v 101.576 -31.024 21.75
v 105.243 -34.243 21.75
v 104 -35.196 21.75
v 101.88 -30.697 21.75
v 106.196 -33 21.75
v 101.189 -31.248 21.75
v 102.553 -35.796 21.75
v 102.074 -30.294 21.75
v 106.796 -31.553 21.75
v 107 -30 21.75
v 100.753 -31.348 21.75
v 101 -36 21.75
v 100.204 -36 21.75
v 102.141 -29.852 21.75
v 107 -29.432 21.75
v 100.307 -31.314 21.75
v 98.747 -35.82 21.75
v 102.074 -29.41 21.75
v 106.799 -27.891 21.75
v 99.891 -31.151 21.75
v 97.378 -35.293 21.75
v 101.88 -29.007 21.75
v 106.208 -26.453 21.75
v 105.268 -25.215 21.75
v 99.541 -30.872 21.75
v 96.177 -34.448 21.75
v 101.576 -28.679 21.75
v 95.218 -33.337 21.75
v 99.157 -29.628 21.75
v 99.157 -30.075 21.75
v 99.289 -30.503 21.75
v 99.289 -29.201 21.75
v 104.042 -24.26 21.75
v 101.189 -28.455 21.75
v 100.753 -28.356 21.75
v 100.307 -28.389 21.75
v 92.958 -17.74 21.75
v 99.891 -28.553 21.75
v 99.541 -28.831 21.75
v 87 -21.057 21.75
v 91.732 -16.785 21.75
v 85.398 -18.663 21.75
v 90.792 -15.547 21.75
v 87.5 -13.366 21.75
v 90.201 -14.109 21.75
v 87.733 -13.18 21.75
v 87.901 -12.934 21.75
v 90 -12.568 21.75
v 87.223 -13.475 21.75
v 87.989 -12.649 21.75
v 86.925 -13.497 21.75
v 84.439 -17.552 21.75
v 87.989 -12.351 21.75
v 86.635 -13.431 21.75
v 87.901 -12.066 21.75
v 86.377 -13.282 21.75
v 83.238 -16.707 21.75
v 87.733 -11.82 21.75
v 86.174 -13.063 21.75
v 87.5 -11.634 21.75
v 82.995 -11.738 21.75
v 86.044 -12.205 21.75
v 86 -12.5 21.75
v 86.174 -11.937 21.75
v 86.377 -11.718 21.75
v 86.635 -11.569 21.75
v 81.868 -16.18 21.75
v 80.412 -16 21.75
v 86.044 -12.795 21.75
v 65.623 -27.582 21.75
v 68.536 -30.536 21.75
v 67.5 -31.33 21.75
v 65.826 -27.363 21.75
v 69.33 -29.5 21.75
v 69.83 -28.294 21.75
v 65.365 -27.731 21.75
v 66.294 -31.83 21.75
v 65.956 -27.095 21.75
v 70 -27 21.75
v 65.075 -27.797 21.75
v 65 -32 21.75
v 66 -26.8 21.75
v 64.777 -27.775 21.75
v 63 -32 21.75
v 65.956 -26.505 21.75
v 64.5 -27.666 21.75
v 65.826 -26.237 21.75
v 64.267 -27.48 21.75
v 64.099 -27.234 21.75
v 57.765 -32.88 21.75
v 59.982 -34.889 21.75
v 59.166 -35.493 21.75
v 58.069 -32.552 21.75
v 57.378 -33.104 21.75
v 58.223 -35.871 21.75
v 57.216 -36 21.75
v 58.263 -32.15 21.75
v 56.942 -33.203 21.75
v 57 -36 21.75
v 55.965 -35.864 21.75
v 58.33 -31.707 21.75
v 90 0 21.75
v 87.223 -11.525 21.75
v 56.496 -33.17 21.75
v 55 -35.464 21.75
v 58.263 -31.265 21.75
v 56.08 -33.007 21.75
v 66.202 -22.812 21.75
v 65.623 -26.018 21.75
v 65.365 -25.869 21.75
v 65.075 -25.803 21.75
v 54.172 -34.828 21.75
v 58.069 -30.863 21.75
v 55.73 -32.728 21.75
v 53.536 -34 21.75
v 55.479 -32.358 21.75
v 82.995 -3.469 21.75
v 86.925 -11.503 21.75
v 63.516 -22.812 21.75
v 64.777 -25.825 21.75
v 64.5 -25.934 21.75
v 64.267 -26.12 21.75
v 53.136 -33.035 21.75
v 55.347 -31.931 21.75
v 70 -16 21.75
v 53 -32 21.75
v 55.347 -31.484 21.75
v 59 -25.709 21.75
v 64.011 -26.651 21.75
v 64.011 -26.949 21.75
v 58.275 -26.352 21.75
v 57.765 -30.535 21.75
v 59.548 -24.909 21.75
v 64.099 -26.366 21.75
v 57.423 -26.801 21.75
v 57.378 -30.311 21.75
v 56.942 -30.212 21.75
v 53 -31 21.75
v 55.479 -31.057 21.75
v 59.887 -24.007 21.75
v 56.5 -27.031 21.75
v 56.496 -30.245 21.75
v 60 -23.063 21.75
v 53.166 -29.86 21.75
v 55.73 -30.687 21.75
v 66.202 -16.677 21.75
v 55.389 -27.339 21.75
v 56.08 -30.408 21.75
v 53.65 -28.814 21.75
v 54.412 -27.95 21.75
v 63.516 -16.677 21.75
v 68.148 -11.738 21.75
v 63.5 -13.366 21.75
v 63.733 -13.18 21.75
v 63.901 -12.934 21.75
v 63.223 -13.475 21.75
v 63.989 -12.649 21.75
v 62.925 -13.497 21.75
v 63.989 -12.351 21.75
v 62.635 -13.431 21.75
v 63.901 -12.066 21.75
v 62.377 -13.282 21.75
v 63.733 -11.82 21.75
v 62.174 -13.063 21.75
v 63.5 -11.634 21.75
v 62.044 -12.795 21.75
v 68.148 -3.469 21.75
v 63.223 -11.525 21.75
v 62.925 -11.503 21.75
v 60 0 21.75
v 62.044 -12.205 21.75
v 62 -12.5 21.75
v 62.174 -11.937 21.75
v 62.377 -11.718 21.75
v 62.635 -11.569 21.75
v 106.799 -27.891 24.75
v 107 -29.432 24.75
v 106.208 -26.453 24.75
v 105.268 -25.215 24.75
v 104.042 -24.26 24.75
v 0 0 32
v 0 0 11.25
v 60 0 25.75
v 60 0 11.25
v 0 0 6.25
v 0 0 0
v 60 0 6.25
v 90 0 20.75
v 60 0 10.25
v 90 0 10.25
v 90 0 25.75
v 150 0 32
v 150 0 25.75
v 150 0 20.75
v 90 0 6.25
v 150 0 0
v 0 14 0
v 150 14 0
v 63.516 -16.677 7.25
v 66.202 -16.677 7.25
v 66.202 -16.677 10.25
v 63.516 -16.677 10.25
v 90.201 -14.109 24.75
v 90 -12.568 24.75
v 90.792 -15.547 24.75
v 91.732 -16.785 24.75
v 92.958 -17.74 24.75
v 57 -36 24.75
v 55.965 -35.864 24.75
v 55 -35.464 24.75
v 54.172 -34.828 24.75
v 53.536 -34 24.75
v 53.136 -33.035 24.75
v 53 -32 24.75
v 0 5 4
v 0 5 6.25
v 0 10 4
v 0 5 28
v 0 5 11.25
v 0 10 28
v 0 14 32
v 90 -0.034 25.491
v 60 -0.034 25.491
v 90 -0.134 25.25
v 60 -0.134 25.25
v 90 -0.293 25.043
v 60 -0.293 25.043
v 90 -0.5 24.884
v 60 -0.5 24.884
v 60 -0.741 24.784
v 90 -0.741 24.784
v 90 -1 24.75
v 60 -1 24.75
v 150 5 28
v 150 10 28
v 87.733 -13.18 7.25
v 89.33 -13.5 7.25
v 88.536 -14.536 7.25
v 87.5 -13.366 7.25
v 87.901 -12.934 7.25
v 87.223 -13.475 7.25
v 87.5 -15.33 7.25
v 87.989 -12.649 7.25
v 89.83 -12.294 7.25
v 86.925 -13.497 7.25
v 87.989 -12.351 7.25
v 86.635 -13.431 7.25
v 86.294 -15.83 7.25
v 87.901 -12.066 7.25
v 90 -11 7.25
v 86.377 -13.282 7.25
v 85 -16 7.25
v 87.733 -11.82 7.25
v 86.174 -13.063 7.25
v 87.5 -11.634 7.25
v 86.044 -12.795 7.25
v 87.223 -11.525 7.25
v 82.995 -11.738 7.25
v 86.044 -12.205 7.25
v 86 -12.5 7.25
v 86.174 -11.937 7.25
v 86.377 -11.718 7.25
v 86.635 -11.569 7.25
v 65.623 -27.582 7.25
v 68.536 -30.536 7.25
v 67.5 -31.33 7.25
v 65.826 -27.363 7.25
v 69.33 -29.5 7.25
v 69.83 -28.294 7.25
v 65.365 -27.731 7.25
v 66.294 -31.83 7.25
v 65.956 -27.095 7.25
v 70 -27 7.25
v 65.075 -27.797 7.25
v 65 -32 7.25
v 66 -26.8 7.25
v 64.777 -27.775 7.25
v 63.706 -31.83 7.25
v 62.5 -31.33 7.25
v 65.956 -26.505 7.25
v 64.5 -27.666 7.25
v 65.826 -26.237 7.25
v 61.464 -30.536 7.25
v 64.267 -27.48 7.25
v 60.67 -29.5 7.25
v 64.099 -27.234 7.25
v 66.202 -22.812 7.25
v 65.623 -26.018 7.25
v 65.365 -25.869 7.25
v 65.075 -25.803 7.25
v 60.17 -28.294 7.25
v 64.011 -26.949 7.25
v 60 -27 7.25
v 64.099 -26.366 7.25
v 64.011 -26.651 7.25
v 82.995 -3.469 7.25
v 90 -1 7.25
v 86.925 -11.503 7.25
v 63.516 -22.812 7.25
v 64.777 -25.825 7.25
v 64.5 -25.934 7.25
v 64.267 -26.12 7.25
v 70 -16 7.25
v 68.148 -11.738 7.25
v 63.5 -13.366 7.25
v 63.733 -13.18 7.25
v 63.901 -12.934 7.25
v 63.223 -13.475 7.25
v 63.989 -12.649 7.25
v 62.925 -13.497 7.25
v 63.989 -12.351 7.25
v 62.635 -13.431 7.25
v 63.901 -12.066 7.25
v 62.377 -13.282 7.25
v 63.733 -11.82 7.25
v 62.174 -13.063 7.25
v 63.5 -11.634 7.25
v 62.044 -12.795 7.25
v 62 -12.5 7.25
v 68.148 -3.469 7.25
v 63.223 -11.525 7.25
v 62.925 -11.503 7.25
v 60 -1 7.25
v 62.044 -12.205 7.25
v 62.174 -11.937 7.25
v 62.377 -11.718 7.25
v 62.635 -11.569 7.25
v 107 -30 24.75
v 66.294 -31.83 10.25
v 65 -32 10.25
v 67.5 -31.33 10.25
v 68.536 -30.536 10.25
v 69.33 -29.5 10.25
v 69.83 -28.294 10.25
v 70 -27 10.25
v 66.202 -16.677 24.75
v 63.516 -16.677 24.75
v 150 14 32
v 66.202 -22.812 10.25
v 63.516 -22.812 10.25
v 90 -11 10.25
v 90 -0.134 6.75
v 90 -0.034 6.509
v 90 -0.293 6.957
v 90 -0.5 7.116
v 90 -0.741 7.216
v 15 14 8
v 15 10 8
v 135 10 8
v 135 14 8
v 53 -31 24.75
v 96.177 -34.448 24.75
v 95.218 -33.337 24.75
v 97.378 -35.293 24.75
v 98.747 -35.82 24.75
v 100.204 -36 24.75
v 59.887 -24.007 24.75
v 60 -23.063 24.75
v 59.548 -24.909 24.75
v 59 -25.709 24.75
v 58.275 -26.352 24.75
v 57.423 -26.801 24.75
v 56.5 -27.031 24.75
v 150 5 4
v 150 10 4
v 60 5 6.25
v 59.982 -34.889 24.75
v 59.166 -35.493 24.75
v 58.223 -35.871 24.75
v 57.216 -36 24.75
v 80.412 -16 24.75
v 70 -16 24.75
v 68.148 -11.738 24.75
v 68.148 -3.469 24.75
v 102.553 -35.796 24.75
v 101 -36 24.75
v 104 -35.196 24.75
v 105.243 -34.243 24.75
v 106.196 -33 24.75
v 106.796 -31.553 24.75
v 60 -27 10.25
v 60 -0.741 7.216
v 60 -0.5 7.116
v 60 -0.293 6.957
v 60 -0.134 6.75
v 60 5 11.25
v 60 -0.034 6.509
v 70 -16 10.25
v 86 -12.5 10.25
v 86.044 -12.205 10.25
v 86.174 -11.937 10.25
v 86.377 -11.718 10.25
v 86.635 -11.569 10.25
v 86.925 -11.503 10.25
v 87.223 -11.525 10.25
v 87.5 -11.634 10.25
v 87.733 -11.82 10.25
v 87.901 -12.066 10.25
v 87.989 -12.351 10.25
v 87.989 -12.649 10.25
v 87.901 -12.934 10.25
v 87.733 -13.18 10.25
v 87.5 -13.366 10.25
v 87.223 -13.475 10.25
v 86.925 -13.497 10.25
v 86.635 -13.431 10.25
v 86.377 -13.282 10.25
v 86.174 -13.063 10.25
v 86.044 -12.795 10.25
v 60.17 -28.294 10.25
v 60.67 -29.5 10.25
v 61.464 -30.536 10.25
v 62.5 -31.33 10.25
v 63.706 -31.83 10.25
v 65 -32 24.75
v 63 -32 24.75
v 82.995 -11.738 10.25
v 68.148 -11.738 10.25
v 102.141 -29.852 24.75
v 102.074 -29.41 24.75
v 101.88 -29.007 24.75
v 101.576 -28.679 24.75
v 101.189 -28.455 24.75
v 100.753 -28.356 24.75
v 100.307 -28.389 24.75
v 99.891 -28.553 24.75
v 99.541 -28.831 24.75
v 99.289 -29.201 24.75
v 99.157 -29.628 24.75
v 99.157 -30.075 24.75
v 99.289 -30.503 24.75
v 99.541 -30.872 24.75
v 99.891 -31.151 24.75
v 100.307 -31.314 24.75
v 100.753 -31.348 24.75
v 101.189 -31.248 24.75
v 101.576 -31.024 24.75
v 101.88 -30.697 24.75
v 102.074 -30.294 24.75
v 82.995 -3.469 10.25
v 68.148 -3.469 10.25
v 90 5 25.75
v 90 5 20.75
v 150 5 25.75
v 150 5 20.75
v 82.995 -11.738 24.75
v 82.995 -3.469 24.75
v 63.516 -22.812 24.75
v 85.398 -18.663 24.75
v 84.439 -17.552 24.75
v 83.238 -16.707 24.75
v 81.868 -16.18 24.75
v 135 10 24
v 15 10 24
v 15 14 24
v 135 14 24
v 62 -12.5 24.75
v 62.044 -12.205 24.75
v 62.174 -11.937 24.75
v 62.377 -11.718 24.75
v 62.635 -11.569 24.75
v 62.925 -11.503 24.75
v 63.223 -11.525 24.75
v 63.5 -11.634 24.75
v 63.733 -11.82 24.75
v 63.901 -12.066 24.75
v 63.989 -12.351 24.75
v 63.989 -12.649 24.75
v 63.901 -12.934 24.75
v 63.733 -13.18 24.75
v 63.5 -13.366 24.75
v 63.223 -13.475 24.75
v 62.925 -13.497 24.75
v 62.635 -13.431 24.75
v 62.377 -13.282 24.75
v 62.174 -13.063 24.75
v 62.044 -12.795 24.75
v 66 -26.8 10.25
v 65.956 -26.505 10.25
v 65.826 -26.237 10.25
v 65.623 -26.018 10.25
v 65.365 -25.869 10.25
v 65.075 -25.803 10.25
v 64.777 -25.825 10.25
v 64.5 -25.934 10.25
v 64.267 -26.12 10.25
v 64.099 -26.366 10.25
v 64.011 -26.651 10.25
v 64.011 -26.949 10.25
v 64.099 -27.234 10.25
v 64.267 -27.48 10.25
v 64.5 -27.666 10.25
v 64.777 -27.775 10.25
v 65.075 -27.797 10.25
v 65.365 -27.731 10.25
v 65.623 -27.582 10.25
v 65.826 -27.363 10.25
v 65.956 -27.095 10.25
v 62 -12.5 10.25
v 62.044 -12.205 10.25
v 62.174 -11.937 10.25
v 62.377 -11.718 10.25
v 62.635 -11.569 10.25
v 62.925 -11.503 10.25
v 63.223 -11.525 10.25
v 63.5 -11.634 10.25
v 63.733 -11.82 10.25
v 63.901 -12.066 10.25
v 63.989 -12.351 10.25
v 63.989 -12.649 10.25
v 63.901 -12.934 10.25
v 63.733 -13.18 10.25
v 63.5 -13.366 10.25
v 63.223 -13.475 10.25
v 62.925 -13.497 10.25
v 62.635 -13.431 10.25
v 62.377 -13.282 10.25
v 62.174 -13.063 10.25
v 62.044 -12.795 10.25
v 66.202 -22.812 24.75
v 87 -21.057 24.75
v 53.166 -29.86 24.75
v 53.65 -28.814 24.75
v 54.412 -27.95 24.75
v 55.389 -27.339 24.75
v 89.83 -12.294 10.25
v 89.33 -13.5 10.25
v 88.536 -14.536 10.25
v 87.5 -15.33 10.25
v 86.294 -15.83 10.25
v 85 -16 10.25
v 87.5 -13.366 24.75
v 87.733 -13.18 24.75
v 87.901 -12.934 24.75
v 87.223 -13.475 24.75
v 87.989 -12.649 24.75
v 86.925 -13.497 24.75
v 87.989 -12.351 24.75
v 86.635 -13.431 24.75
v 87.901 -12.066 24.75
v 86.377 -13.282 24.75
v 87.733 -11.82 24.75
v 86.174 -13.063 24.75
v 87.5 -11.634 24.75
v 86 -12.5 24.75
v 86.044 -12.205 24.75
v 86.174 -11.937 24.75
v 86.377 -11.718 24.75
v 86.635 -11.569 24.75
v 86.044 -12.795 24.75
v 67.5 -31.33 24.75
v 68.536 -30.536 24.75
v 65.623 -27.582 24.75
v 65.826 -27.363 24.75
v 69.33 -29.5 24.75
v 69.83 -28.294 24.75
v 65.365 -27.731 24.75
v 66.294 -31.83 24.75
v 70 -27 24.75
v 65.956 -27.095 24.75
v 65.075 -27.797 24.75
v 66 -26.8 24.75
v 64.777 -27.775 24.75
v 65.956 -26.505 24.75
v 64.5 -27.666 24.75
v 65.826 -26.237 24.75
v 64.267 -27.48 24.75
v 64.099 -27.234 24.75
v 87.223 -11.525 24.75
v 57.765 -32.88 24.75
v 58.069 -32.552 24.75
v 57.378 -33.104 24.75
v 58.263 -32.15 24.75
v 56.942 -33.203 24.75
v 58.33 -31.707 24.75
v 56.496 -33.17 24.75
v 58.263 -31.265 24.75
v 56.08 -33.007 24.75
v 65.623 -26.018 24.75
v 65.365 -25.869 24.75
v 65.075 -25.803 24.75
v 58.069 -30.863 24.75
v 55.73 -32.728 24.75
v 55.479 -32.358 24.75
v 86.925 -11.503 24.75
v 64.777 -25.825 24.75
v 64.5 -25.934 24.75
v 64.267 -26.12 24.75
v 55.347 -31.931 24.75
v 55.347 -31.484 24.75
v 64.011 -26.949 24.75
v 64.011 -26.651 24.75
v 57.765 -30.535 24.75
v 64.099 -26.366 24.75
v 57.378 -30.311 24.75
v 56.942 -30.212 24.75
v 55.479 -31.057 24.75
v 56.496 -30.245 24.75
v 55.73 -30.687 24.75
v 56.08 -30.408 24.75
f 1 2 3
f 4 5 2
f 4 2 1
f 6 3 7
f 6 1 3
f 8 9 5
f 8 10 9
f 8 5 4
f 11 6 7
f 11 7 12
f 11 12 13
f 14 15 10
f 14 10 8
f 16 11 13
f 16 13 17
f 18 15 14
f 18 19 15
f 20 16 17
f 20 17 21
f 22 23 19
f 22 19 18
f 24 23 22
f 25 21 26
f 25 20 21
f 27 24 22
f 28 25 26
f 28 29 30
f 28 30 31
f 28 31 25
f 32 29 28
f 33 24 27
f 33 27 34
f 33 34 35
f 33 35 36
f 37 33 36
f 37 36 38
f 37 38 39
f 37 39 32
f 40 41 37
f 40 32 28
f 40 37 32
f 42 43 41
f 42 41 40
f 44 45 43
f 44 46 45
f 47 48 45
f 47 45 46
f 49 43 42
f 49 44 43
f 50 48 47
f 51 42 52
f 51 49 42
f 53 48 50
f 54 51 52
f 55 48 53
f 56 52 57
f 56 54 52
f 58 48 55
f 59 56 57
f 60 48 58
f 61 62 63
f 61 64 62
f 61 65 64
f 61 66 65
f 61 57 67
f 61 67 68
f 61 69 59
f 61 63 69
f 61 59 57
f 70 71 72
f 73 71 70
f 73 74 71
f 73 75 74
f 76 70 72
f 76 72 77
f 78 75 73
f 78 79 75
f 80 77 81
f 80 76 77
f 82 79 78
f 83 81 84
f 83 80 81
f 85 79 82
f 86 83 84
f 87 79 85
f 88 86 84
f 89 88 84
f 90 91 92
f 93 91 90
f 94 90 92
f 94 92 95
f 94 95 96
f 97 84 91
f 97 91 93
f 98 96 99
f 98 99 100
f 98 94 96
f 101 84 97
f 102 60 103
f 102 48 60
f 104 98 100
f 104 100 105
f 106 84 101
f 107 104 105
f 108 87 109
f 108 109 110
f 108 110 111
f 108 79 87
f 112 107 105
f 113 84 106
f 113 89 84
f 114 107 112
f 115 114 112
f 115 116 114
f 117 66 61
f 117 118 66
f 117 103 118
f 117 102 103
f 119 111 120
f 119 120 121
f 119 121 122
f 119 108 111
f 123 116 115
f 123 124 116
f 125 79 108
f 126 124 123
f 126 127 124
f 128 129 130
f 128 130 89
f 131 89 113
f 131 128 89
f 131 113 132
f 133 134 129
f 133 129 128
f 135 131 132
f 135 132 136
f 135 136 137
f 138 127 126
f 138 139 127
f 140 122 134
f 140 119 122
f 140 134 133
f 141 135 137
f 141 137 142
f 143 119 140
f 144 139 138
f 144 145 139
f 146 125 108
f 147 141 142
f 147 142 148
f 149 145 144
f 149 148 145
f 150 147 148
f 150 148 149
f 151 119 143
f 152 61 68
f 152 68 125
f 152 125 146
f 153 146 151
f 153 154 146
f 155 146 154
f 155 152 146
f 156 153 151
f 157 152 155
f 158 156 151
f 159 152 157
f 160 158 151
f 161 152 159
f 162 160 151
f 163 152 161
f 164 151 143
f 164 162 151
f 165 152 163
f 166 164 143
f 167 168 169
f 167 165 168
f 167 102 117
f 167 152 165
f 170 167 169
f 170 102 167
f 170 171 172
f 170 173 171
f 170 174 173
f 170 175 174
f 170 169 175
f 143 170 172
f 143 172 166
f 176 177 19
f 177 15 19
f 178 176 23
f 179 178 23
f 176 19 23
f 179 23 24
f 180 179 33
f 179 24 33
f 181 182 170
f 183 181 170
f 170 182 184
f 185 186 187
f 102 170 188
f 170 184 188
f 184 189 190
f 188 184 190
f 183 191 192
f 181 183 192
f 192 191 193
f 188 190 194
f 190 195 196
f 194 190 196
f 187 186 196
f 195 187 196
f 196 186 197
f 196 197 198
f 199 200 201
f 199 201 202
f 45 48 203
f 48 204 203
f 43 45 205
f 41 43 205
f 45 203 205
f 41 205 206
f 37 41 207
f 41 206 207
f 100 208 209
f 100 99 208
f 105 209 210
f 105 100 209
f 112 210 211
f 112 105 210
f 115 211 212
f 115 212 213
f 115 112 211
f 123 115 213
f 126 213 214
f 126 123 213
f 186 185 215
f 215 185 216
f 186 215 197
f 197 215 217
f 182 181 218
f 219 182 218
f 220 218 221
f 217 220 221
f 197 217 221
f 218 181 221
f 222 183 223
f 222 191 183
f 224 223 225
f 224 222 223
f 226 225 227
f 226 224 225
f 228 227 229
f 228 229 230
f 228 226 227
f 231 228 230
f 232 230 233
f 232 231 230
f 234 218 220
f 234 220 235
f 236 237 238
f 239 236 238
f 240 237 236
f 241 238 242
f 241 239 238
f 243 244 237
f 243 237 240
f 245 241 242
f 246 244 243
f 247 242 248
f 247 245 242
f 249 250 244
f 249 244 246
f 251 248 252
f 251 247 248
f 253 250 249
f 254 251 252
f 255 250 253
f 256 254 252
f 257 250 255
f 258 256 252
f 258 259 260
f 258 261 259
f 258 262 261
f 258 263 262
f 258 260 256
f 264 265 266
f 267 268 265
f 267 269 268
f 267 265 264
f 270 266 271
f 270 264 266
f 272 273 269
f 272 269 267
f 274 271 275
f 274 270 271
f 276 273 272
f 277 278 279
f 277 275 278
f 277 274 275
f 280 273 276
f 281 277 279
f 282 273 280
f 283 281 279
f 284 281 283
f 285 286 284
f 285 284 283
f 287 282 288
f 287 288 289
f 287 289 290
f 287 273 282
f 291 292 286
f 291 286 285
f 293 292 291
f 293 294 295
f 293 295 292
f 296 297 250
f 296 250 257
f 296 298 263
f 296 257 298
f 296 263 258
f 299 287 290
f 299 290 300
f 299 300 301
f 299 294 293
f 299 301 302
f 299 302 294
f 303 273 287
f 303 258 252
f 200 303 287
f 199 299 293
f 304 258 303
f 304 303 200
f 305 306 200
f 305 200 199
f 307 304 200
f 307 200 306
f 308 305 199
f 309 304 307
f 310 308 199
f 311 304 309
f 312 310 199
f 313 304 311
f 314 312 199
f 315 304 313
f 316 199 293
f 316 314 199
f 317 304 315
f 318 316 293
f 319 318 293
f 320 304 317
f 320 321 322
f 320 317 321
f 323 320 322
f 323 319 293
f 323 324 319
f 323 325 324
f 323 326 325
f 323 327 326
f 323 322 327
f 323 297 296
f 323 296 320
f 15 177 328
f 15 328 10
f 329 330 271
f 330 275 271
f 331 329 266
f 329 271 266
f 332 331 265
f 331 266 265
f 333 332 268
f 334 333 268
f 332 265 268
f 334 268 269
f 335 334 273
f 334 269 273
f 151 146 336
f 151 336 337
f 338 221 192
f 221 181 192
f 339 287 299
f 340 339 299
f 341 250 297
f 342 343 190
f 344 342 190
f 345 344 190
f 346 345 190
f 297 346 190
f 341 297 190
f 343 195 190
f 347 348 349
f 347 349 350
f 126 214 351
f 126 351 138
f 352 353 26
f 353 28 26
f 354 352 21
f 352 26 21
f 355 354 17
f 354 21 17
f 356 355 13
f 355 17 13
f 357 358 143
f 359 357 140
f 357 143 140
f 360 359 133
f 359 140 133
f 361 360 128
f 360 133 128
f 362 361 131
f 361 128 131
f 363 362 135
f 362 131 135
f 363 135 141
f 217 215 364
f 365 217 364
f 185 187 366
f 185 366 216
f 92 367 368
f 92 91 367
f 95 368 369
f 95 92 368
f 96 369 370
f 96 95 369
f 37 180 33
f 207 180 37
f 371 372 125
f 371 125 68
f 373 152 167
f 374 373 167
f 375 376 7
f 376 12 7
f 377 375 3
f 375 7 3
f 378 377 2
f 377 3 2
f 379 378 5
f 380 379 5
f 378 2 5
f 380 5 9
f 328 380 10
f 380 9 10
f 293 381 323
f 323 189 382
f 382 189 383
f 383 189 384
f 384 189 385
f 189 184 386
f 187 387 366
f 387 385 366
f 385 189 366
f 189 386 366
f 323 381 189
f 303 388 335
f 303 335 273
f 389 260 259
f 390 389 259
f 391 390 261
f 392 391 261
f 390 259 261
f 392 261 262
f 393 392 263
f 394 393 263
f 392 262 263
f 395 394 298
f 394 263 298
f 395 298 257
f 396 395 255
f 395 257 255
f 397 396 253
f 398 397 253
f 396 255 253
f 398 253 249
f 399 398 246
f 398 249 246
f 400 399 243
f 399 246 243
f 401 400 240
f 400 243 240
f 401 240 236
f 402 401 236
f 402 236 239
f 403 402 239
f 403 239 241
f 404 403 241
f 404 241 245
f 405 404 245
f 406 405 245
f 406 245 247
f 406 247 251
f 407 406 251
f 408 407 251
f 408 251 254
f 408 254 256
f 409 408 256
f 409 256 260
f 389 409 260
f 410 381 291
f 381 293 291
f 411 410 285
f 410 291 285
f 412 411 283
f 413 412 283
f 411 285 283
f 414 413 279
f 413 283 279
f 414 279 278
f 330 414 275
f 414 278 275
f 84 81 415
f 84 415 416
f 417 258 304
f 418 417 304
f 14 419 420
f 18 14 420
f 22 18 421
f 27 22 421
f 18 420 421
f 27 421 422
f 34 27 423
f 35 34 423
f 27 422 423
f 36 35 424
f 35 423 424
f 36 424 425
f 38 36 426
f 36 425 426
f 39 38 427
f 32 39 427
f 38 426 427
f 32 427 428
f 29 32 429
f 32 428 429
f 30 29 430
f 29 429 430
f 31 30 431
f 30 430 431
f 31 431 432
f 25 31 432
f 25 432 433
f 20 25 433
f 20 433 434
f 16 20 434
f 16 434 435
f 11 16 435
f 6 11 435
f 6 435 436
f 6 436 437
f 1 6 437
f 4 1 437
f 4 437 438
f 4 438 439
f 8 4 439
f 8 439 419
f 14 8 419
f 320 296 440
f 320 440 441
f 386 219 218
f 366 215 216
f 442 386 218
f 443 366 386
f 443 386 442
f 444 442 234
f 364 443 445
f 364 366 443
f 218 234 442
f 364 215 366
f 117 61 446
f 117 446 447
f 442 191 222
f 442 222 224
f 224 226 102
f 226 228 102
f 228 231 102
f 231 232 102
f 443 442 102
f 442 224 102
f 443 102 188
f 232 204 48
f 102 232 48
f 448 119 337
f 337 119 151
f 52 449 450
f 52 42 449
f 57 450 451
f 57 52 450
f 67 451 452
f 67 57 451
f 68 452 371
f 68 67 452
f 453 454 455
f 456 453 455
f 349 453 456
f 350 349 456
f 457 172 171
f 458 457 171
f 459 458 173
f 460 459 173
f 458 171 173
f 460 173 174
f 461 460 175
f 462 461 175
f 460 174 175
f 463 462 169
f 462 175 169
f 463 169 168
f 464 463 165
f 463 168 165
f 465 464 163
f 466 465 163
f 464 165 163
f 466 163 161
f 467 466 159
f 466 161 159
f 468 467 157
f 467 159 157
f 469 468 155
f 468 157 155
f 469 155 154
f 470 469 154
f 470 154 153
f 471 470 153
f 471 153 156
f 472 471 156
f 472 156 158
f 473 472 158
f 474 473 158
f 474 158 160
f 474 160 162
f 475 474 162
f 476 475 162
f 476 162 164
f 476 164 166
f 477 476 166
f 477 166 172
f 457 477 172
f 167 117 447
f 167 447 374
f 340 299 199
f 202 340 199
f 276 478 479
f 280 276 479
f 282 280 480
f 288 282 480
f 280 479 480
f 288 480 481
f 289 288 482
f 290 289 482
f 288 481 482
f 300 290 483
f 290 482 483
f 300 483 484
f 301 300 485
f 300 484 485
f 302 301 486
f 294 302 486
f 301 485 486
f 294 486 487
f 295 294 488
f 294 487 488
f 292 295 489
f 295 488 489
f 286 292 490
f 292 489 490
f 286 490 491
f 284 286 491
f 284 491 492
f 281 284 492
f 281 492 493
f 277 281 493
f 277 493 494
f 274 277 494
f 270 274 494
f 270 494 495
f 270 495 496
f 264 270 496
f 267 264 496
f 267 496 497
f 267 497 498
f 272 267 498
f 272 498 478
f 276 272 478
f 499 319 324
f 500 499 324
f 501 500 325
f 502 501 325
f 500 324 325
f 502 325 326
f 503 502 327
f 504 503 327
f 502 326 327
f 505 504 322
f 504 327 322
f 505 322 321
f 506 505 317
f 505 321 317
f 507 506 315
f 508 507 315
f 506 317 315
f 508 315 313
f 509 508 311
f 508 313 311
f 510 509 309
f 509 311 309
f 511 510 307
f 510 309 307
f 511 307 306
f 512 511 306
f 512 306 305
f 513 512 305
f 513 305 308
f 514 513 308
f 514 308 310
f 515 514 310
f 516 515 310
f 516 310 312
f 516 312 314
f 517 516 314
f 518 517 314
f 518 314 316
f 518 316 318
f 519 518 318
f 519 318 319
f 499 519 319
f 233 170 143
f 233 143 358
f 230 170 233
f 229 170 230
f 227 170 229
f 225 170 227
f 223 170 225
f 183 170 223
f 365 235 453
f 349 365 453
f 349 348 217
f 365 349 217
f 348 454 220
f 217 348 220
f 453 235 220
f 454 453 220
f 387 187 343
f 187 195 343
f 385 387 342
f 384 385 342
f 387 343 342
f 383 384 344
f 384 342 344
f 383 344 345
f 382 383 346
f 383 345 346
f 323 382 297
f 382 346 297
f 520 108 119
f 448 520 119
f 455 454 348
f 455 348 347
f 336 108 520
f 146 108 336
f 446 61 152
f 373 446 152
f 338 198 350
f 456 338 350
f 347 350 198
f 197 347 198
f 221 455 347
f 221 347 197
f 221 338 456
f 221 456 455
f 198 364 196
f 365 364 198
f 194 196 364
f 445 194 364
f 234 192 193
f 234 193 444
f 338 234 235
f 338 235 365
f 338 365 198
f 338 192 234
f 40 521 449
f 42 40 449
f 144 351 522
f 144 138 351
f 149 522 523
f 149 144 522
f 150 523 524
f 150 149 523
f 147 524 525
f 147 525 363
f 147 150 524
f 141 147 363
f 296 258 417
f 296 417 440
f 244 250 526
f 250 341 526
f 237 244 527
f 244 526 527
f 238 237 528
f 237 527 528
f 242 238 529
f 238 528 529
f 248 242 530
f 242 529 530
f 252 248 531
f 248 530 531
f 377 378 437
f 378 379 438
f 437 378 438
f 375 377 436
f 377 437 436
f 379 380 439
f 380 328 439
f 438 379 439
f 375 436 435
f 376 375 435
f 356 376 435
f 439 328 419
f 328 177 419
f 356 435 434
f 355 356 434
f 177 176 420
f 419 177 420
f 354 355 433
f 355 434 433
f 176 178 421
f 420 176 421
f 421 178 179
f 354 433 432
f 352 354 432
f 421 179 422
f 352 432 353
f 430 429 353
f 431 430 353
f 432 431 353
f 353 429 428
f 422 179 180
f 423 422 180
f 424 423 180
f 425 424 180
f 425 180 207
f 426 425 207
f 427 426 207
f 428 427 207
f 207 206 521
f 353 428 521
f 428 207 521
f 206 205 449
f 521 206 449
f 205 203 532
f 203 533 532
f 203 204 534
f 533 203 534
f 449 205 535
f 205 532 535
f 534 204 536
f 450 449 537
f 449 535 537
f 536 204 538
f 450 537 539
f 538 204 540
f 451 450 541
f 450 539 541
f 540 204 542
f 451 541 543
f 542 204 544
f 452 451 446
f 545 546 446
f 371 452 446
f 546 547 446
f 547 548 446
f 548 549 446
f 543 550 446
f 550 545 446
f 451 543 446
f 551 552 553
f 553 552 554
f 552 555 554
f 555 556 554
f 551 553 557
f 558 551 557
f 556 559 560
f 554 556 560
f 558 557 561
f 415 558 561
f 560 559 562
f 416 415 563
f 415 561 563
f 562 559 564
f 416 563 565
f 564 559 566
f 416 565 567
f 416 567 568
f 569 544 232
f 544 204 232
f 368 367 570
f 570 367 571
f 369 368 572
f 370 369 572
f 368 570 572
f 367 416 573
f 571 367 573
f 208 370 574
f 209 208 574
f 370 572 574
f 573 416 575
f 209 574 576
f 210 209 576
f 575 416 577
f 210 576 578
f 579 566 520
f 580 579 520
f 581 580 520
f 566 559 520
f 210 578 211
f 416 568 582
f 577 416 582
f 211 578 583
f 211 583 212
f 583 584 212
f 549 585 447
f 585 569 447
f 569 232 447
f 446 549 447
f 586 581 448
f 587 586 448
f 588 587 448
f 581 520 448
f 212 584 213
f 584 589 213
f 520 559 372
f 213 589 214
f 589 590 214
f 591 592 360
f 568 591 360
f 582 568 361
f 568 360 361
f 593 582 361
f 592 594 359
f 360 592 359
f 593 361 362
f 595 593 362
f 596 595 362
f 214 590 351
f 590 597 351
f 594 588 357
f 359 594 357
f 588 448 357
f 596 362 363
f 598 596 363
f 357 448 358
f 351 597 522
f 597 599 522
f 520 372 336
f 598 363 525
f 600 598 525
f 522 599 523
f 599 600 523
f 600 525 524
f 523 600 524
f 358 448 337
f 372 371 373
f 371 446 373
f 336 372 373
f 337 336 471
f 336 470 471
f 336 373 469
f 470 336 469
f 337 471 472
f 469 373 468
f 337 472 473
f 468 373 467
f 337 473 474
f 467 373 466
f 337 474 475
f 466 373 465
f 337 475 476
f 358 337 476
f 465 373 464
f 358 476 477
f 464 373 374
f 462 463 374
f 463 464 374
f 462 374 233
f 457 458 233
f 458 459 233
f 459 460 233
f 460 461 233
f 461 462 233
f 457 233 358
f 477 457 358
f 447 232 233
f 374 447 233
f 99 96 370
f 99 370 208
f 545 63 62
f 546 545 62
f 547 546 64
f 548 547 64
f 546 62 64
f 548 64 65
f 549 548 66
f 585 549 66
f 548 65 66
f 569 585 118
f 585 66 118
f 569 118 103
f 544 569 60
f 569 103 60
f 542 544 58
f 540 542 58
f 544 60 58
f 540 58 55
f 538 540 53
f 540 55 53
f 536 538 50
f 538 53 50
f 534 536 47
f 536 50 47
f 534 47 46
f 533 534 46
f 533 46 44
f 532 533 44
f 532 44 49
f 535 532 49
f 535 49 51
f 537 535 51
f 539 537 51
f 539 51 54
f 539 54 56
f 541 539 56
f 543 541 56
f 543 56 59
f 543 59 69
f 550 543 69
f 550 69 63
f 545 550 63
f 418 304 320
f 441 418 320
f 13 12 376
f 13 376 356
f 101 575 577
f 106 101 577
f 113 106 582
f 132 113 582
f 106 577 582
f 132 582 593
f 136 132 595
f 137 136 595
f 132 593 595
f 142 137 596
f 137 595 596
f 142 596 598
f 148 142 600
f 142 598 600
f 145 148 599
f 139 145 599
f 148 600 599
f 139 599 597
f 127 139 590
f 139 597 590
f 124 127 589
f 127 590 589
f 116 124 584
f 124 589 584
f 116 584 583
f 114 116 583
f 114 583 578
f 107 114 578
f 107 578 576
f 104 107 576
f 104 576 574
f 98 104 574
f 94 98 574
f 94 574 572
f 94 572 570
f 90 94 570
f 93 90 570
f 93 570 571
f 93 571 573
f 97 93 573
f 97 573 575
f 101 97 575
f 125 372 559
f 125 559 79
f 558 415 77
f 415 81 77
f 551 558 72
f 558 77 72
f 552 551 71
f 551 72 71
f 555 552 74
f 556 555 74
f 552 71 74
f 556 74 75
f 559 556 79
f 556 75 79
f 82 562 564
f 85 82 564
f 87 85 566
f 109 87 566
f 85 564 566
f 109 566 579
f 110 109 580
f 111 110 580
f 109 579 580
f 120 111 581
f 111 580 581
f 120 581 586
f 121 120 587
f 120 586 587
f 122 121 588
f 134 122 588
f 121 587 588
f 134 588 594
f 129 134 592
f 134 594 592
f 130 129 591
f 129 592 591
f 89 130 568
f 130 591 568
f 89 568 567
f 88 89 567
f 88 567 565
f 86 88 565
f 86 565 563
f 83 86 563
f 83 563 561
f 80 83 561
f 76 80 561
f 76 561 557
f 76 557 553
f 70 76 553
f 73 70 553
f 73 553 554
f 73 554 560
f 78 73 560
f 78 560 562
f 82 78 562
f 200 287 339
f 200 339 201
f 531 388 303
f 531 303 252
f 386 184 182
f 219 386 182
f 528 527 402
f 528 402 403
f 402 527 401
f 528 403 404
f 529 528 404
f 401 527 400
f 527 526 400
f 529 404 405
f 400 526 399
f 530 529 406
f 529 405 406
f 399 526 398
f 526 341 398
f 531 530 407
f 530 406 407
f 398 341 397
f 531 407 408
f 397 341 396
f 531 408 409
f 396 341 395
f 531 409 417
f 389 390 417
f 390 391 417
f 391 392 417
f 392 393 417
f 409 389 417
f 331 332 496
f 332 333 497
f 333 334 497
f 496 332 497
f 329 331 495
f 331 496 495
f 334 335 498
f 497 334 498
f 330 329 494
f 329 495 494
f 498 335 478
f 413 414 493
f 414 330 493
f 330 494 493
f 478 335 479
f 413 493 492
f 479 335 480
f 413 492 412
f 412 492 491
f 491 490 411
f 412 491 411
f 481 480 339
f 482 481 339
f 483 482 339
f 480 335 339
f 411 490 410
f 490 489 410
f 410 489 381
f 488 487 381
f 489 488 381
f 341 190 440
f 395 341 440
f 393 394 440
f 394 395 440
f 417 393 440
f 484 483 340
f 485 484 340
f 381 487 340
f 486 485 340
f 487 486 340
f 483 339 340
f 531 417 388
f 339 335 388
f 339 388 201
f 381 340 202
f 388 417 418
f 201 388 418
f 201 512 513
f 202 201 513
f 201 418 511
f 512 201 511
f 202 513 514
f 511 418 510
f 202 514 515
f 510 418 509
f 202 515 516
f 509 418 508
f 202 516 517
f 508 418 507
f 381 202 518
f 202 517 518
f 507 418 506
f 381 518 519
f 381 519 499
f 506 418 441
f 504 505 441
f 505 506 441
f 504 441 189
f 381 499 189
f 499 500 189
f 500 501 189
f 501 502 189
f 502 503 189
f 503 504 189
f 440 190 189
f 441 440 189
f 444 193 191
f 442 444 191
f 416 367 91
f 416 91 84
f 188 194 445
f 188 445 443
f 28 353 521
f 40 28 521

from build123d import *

# Parameters (mm, degrees)
SKETCH1_W            = 150
SKETCH1_H            = 32
BOSS_EXTRUDE1_DEPTH  = 5
SKETCH2_W            = 150
SKETCH2_H            = 4
BOSS_EXTRUDE2_DEPTH  = 9
SKETCH4_W            = 4
SKETCH4_H            = 4
BOSS_EXTRUDE3_DEPTH  = 150
SKETCH5_W            = 60
SKETCH5_H            = 5
CUT_EXTRUDE1_DEPTH   = 6
BOSS_EXTRUDE4_REACH  = 154.552
SKETCH6_W            = 15
SKETCH6_H            = 4
SKETCH7_W            = 60
SKETCH7_H            = 5
CUT_EXTRUDE2_DEPTH   = 6
SKETCH8_W            = 30
SKETCH8_H            = 3
BOSS_EXTRUDE5_DEPTH  = 16
SKETCH9_R            = 1
CUT_EXTRUDE3_DEPTH   = 153.867794188
SKETCH11_W           = 10
SKETCH11_H           = 3
BOSS_EXTRUDE7_DEPTH  = 16
SKETCH12_R           = 1
CUT_EXTRUDE4_DEPTH   = 156.359462216
SKETCH13_W           = 20
SKETCH13_H           = 3
BOSS_EXTRUDE8_DEPTH  = 20
SKETCH14_W           = 10
SKETCH14_H           = 3
BOSS_EXTRUDE9_DEPTH  = 4
SKETCH15_W           = 7
SKETCH15_H           = 3
BOSS_EXTRUDE10_DEPTH = 5
SKETCH16_R           = 1.5
CUT_EXTRUDE5_DEPTH   = 157.232399009
CUT_EXTRUDE6_DEPTH   = 5
CUT_EXTRUDE7_DEPTH   = 5
BOSS_EXTRUDE11_DEPTH = 3
CUT_EXTRUDE8_DEPTH   = 3
SKETCH21_W           = 14.847248178
SKETCH21_H           = 8.269274671
CUT_EXTRUDE9_DEPTH   = 157.232399009
FILLET3_R            = 6
FILLET4_R            = 4
FILLET5_R            = 5
FILLET6_R            = 5
SKETCH22_W           = 2.686432883
SKETCH22_H           = 6.135326584
CUT_EXTRUDE10_DEPTH  = 157.232399009
FILLET7_R            = 6
FILLET8_R            = 6
FILLET9_R            = 4
FILLET10_R           = 1
FILLET11_R           = 1


with BuildPart() as part:
    # Sketch1 → Boss-Extrude1 (new body)
    with BuildSketch(Plane(origin=(0, 0, 0), x_dir=(1, 0, 0), z_dir=(0, 1, 0))):
        with Locations((75, -16)):
            Rectangle(SKETCH1_W, SKETCH1_H)
    extrude(amount=BOSS_EXTRUDE1_DEPTH)

    # Sketch2 → Boss-Extrude2 (add)
    with BuildSketch(Plane(origin=(0, 5, 0), x_dir=(1, 0, 0), z_dir=(0, 1, 0))):
        with Locations((75, -30)):
            Rectangle(SKETCH2_W, SKETCH2_H)
        with Locations((75, -2)):
            Rectangle(SKETCH2_W, SKETCH2_H)
    extrude(amount=BOSS_EXTRUDE2_DEPTH)

    # Sketch4 → Boss-Extrude3 (add)
    with BuildSketch(Plane.ZY):
        with Locations((6, 12)):
            Rectangle(SKETCH4_W, SKETCH4_H)
        with Locations((26, 12)):
            Rectangle(SKETCH4_W, SKETCH4_H)
    extrude(amount=-BOSS_EXTRUDE3_DEPTH)

    # Sketch5 → Cut-Extrude1 (cut)
    with BuildSketch(Plane(origin=(0, 0, 0), x_dir=(-1, 0, 0), z_dir=(0, -1, 0))):
        with Locations((-120, -23.25)):
            Rectangle(SKETCH5_W, SKETCH5_H)
    extrude(amount=-CUT_EXTRUDE1_DEPTH, mode=Mode.SUBTRACT)

    # Sketch6 → Boss-Extrude4 (add, up to next)
    with BuildSketch(Plane(origin=(0, 0, 24), x_dir=(-1, 0, 0), z_dir=(0, 0, -1)), mode=Mode.PRIVATE) as boss_extrude4_sk1:
        with Locations((-142.5, 12)):
            Rectangle(SKETCH6_W, SKETCH6_H)
    boss_extrude4_tool1 = extrude(boss_extrude4_sk1.sketch, amount=BOSS_EXTRUDE4_REACH, mode=Mode.PRIVATE) - part.part
    # Sketch6 → Boss-Extrude4 (add, up to next)
    with BuildSketch(Plane(origin=(0, 0, 24), x_dir=(-1, 0, 0), z_dir=(0, 0, -1)), mode=Mode.PRIVATE) as boss_extrude4_sk2:
        with Locations((-7.5, 12)):
            Rectangle(SKETCH6_W, SKETCH6_H)
    boss_extrude4_tool2 = extrude(boss_extrude4_sk2.sketch, amount=BOSS_EXTRUDE4_REACH, mode=Mode.PRIVATE) - part.part
    add(boss_extrude4_tool1.solids().sort_by_distance((142.5, 12, 24))[0])
    add(boss_extrude4_tool2.solids().sort_by_distance((7.5, 12, 24))[0])

    # Sketch7 → Cut-Extrude2 (cut)
    with BuildSketch(Plane(origin=(0, 0, 0), x_dir=(-1, 0, 0), z_dir=(0, -1, 0))):
        with Locations((-30, -8.75)):
            Rectangle(SKETCH7_W, SKETCH7_H)
    extrude(amount=-CUT_EXTRUDE2_DEPTH, mode=Mode.SUBTRACT)

    # Sketch8 → Boss-Extrude5 (add)
    with BuildSketch(Plane.XZ):
        with Locations((75, 23.25)):
            Rectangle(SKETCH8_W, SKETCH8_H)
        with Locations((75, 8.75)):
            Rectangle(SKETCH8_W, SKETCH8_H)
    extrude(amount=BOSS_EXTRUDE5_DEPTH)

    # Sketch9 → Cut-Extrude3 (cut, through all)
    with BuildSketch(Plane(origin=(0, 0, 7.25), x_dir=(-1, 0, 0), z_dir=(0, 0, -1))):
        with Locations((-63, -12.5)):
            Circle(SKETCH9_R)
        with Locations((-87, -12.5)):
            Circle(SKETCH9_R)
    extrude(amount=-CUT_EXTRUDE3_DEPTH, mode=Mode.SUBTRACT)

    # Sketch11 → Boss-Extrude7 (add)
    with BuildSketch(Plane(origin=(0, -16, 0), x_dir=(-1, 0, 0), z_dir=(0, -1, 0))):
        with Locations((-65, -8.75)):
            Rectangle(SKETCH11_W, SKETCH11_H)
        with Locations((-65, -23.25)):
            Rectangle(SKETCH11_W, SKETCH11_H)
    extrude(amount=BOSS_EXTRUDE7_DEPTH)

    # Sketch12 → Cut-Extrude4 (cut, through all)
    with BuildSketch(Plane.XY.offset(24.75)):
        with Locations((65, -26.8)):
            Circle(SKETCH12_R)
    extrude(amount=-CUT_EXTRUDE4_DEPTH, mode=Mode.SUBTRACT)

    # Sketch13 → Boss-Extrude8 (add)
    with BuildSketch(Plane(origin=(0, -16, 0), x_dir=(-1, 0, 0), z_dir=(0, -1, 0))):
        with Locations((-97, -23.25)):
            Rectangle(SKETCH13_W, SKETCH13_H)
    extrude(amount=BOSS_EXTRUDE8_DEPTH)

    # Sketch14 → Boss-Extrude9 (add)
    with BuildSketch(Plane(origin=(0, -32, 0), x_dir=(-1, 0, 0), z_dir=(0, -1, 0))):
        with Locations((-58, -23.25)):
            Rectangle(SKETCH14_W, SKETCH14_H)
    extrude(amount=BOSS_EXTRUDE9_DEPTH)

    # Sketch15 → Boss-Extrude10 (add)
    with BuildSketch(Plane(origin=(0, -32, 0), x_dir=(1, 0, 0), z_dir=(0, 1, 0))):
        with Locations((56.5, -23.25)):
            Rectangle(SKETCH15_W, SKETCH15_H)
    extrude(amount=BOSS_EXTRUDE10_DEPTH)

    # Sketch16 → Cut-Extrude5 (cut, through all)
    with BuildSketch(Plane.XY.offset(24.75)):
        with Locations((56.830024482, -31.707497886)):
            Circle(SKETCH16_R)
        with Locations((100.640738332, -29.851736065)):
            Circle(SKETCH16_R)
    extrude(amount=-CUT_EXTRUDE5_DEPTH, mode=Mode.SUBTRACT)

    # Sketch17 → Cut-Extrude6 (cut)
    with BuildSketch(Plane.XY.offset(24.75)):
        Polygon((97, -36), (87, -21.056914339), (87, -36), align=None)
    extrude(amount=-CUT_EXTRUDE6_DEPTH, mode=Mode.SUBTRACT)

    # Sketch18 → Cut-Extrude7 (cut)
    with BuildSketch(Plane.XY.offset(24.75)):
        Polygon((107, -26), (90, -16), (107, -16), align=None)
    extrude(amount=-CUT_EXTRUDE7_DEPTH, mode=Mode.SUBTRACT)

    # Sketch19 → Boss-Extrude11 (add)
    with BuildSketch(Plane.XY.offset(24.75)):
        Polygon((87, -21.056914339), (83.615883457, -16), (87, -16), align=None)
    extrude(amount=-BOSS_EXTRUDE11_DEPTH)

    # Sketch20 → Cut-Extrude8 (cut)
    with BuildSketch(Plane.XY.offset(24.75)):
        Polygon((58.822210862, -36), (63, -32), (63, -36), align=None)
    extrude(amount=-CUT_EXTRUDE8_DEPTH, mode=Mode.SUBTRACT)

    # Sketch21 → Cut-Extrude9 (cut, through all)
    with BuildSketch(Plane(origin=(0, 0, 7.25), x_dir=(-1, 0, 0), z_dir=(0, 0, -1))):
        with Locations((-75.571857051, -7.603356602)):
            Rectangle(SKETCH21_W, SKETCH21_H)
    extrude(amount=-CUT_EXTRUDE9_DEPTH, mode=Mode.SUBTRACT)

    # Fillet3
    fillet3_edges = [part.edges().sort_by_distance(p)[0] for p in [
        (107, -36, 23.25),
        (97, -36, 23.25),
        (107, -26, 23.25),
    ]]
    fillet(fillet3_edges, radius=FILLET3_R)

    # Fillet4
    fillet4_edges = [part.edges().sort_by_distance(p)[0] for p in [
        (53, -36, 23.25),
        (53, -27, 23.25),
        (58.822210862, -36, 23.25),
    ]]
    fillet(fillet4_edges, radius=FILLET4_R)

    # Fillet5
    fillet5_edges = [part.edges().sort_by_distance(p)[0] for p in [
        (90, -16, 8.75),
        (70, -32, 8.75),
        (60, -32, 8.75),
    ]]
    fillet(fillet5_edges, radius=FILLET5_R - 0.0001)  # a hair under: the kernel refuses the full size

    # Fillet6
    fillet6_edges = [part.edges().sort_by_distance(p)[0] for p in [
        (70, -32, 23.25),
    ]]
    fillet(fillet6_edges, radius=FILLET6_R)

    # Sketch22 → Cut-Extrude10 (cut, through all)
    with BuildSketch(Plane(origin=(0, 0, 7.25), x_dir=(-1, 0, 0), z_dir=(0, 0, -1))):
        with Locations((-64.85928039, -19.744776936)):
            Rectangle(SKETCH22_W, SKETCH22_H)
    extrude(amount=-CUT_EXTRUDE10_DEPTH, mode=Mode.SUBTRACT)

    # Fillet7
    fillet7_edges = [part.edges().sort_by_distance(p)[0] for p in [
        (90, -16, 23.25),
    ]]
    fillet(fillet7_edges, radius=FILLET7_R)

    # Fillet8
    fillet8_edges = [part.edges().sort_by_distance(p)[0] for p in [
        (83.615883457, -16, 23.25),
    ]]
    fillet(fillet8_edges, radius=FILLET8_R)

    # Fillet9
    fillet9_edges = [part.edges().sort_by_distance(p)[0] for p in [
        (60, -27, 23.25),
    ]]
    fillet(fillet9_edges, radius=FILLET9_R)

    # Fillet10
    fillet10_edges = [part.edges().sort_by_distance(p)[0] for p in [
        (75, 0, 7.25),
    ]]
    fillet(fillet10_edges, radius=FILLET10_R)

    # Fillet11
    fillet11_edges = [part.edges().sort_by_distance(p)[0] for p in [
        (75, 0, 24.75),
    ]]
    fillet(fillet11_edges, radius=FILLET11_R)


solid = part.part
